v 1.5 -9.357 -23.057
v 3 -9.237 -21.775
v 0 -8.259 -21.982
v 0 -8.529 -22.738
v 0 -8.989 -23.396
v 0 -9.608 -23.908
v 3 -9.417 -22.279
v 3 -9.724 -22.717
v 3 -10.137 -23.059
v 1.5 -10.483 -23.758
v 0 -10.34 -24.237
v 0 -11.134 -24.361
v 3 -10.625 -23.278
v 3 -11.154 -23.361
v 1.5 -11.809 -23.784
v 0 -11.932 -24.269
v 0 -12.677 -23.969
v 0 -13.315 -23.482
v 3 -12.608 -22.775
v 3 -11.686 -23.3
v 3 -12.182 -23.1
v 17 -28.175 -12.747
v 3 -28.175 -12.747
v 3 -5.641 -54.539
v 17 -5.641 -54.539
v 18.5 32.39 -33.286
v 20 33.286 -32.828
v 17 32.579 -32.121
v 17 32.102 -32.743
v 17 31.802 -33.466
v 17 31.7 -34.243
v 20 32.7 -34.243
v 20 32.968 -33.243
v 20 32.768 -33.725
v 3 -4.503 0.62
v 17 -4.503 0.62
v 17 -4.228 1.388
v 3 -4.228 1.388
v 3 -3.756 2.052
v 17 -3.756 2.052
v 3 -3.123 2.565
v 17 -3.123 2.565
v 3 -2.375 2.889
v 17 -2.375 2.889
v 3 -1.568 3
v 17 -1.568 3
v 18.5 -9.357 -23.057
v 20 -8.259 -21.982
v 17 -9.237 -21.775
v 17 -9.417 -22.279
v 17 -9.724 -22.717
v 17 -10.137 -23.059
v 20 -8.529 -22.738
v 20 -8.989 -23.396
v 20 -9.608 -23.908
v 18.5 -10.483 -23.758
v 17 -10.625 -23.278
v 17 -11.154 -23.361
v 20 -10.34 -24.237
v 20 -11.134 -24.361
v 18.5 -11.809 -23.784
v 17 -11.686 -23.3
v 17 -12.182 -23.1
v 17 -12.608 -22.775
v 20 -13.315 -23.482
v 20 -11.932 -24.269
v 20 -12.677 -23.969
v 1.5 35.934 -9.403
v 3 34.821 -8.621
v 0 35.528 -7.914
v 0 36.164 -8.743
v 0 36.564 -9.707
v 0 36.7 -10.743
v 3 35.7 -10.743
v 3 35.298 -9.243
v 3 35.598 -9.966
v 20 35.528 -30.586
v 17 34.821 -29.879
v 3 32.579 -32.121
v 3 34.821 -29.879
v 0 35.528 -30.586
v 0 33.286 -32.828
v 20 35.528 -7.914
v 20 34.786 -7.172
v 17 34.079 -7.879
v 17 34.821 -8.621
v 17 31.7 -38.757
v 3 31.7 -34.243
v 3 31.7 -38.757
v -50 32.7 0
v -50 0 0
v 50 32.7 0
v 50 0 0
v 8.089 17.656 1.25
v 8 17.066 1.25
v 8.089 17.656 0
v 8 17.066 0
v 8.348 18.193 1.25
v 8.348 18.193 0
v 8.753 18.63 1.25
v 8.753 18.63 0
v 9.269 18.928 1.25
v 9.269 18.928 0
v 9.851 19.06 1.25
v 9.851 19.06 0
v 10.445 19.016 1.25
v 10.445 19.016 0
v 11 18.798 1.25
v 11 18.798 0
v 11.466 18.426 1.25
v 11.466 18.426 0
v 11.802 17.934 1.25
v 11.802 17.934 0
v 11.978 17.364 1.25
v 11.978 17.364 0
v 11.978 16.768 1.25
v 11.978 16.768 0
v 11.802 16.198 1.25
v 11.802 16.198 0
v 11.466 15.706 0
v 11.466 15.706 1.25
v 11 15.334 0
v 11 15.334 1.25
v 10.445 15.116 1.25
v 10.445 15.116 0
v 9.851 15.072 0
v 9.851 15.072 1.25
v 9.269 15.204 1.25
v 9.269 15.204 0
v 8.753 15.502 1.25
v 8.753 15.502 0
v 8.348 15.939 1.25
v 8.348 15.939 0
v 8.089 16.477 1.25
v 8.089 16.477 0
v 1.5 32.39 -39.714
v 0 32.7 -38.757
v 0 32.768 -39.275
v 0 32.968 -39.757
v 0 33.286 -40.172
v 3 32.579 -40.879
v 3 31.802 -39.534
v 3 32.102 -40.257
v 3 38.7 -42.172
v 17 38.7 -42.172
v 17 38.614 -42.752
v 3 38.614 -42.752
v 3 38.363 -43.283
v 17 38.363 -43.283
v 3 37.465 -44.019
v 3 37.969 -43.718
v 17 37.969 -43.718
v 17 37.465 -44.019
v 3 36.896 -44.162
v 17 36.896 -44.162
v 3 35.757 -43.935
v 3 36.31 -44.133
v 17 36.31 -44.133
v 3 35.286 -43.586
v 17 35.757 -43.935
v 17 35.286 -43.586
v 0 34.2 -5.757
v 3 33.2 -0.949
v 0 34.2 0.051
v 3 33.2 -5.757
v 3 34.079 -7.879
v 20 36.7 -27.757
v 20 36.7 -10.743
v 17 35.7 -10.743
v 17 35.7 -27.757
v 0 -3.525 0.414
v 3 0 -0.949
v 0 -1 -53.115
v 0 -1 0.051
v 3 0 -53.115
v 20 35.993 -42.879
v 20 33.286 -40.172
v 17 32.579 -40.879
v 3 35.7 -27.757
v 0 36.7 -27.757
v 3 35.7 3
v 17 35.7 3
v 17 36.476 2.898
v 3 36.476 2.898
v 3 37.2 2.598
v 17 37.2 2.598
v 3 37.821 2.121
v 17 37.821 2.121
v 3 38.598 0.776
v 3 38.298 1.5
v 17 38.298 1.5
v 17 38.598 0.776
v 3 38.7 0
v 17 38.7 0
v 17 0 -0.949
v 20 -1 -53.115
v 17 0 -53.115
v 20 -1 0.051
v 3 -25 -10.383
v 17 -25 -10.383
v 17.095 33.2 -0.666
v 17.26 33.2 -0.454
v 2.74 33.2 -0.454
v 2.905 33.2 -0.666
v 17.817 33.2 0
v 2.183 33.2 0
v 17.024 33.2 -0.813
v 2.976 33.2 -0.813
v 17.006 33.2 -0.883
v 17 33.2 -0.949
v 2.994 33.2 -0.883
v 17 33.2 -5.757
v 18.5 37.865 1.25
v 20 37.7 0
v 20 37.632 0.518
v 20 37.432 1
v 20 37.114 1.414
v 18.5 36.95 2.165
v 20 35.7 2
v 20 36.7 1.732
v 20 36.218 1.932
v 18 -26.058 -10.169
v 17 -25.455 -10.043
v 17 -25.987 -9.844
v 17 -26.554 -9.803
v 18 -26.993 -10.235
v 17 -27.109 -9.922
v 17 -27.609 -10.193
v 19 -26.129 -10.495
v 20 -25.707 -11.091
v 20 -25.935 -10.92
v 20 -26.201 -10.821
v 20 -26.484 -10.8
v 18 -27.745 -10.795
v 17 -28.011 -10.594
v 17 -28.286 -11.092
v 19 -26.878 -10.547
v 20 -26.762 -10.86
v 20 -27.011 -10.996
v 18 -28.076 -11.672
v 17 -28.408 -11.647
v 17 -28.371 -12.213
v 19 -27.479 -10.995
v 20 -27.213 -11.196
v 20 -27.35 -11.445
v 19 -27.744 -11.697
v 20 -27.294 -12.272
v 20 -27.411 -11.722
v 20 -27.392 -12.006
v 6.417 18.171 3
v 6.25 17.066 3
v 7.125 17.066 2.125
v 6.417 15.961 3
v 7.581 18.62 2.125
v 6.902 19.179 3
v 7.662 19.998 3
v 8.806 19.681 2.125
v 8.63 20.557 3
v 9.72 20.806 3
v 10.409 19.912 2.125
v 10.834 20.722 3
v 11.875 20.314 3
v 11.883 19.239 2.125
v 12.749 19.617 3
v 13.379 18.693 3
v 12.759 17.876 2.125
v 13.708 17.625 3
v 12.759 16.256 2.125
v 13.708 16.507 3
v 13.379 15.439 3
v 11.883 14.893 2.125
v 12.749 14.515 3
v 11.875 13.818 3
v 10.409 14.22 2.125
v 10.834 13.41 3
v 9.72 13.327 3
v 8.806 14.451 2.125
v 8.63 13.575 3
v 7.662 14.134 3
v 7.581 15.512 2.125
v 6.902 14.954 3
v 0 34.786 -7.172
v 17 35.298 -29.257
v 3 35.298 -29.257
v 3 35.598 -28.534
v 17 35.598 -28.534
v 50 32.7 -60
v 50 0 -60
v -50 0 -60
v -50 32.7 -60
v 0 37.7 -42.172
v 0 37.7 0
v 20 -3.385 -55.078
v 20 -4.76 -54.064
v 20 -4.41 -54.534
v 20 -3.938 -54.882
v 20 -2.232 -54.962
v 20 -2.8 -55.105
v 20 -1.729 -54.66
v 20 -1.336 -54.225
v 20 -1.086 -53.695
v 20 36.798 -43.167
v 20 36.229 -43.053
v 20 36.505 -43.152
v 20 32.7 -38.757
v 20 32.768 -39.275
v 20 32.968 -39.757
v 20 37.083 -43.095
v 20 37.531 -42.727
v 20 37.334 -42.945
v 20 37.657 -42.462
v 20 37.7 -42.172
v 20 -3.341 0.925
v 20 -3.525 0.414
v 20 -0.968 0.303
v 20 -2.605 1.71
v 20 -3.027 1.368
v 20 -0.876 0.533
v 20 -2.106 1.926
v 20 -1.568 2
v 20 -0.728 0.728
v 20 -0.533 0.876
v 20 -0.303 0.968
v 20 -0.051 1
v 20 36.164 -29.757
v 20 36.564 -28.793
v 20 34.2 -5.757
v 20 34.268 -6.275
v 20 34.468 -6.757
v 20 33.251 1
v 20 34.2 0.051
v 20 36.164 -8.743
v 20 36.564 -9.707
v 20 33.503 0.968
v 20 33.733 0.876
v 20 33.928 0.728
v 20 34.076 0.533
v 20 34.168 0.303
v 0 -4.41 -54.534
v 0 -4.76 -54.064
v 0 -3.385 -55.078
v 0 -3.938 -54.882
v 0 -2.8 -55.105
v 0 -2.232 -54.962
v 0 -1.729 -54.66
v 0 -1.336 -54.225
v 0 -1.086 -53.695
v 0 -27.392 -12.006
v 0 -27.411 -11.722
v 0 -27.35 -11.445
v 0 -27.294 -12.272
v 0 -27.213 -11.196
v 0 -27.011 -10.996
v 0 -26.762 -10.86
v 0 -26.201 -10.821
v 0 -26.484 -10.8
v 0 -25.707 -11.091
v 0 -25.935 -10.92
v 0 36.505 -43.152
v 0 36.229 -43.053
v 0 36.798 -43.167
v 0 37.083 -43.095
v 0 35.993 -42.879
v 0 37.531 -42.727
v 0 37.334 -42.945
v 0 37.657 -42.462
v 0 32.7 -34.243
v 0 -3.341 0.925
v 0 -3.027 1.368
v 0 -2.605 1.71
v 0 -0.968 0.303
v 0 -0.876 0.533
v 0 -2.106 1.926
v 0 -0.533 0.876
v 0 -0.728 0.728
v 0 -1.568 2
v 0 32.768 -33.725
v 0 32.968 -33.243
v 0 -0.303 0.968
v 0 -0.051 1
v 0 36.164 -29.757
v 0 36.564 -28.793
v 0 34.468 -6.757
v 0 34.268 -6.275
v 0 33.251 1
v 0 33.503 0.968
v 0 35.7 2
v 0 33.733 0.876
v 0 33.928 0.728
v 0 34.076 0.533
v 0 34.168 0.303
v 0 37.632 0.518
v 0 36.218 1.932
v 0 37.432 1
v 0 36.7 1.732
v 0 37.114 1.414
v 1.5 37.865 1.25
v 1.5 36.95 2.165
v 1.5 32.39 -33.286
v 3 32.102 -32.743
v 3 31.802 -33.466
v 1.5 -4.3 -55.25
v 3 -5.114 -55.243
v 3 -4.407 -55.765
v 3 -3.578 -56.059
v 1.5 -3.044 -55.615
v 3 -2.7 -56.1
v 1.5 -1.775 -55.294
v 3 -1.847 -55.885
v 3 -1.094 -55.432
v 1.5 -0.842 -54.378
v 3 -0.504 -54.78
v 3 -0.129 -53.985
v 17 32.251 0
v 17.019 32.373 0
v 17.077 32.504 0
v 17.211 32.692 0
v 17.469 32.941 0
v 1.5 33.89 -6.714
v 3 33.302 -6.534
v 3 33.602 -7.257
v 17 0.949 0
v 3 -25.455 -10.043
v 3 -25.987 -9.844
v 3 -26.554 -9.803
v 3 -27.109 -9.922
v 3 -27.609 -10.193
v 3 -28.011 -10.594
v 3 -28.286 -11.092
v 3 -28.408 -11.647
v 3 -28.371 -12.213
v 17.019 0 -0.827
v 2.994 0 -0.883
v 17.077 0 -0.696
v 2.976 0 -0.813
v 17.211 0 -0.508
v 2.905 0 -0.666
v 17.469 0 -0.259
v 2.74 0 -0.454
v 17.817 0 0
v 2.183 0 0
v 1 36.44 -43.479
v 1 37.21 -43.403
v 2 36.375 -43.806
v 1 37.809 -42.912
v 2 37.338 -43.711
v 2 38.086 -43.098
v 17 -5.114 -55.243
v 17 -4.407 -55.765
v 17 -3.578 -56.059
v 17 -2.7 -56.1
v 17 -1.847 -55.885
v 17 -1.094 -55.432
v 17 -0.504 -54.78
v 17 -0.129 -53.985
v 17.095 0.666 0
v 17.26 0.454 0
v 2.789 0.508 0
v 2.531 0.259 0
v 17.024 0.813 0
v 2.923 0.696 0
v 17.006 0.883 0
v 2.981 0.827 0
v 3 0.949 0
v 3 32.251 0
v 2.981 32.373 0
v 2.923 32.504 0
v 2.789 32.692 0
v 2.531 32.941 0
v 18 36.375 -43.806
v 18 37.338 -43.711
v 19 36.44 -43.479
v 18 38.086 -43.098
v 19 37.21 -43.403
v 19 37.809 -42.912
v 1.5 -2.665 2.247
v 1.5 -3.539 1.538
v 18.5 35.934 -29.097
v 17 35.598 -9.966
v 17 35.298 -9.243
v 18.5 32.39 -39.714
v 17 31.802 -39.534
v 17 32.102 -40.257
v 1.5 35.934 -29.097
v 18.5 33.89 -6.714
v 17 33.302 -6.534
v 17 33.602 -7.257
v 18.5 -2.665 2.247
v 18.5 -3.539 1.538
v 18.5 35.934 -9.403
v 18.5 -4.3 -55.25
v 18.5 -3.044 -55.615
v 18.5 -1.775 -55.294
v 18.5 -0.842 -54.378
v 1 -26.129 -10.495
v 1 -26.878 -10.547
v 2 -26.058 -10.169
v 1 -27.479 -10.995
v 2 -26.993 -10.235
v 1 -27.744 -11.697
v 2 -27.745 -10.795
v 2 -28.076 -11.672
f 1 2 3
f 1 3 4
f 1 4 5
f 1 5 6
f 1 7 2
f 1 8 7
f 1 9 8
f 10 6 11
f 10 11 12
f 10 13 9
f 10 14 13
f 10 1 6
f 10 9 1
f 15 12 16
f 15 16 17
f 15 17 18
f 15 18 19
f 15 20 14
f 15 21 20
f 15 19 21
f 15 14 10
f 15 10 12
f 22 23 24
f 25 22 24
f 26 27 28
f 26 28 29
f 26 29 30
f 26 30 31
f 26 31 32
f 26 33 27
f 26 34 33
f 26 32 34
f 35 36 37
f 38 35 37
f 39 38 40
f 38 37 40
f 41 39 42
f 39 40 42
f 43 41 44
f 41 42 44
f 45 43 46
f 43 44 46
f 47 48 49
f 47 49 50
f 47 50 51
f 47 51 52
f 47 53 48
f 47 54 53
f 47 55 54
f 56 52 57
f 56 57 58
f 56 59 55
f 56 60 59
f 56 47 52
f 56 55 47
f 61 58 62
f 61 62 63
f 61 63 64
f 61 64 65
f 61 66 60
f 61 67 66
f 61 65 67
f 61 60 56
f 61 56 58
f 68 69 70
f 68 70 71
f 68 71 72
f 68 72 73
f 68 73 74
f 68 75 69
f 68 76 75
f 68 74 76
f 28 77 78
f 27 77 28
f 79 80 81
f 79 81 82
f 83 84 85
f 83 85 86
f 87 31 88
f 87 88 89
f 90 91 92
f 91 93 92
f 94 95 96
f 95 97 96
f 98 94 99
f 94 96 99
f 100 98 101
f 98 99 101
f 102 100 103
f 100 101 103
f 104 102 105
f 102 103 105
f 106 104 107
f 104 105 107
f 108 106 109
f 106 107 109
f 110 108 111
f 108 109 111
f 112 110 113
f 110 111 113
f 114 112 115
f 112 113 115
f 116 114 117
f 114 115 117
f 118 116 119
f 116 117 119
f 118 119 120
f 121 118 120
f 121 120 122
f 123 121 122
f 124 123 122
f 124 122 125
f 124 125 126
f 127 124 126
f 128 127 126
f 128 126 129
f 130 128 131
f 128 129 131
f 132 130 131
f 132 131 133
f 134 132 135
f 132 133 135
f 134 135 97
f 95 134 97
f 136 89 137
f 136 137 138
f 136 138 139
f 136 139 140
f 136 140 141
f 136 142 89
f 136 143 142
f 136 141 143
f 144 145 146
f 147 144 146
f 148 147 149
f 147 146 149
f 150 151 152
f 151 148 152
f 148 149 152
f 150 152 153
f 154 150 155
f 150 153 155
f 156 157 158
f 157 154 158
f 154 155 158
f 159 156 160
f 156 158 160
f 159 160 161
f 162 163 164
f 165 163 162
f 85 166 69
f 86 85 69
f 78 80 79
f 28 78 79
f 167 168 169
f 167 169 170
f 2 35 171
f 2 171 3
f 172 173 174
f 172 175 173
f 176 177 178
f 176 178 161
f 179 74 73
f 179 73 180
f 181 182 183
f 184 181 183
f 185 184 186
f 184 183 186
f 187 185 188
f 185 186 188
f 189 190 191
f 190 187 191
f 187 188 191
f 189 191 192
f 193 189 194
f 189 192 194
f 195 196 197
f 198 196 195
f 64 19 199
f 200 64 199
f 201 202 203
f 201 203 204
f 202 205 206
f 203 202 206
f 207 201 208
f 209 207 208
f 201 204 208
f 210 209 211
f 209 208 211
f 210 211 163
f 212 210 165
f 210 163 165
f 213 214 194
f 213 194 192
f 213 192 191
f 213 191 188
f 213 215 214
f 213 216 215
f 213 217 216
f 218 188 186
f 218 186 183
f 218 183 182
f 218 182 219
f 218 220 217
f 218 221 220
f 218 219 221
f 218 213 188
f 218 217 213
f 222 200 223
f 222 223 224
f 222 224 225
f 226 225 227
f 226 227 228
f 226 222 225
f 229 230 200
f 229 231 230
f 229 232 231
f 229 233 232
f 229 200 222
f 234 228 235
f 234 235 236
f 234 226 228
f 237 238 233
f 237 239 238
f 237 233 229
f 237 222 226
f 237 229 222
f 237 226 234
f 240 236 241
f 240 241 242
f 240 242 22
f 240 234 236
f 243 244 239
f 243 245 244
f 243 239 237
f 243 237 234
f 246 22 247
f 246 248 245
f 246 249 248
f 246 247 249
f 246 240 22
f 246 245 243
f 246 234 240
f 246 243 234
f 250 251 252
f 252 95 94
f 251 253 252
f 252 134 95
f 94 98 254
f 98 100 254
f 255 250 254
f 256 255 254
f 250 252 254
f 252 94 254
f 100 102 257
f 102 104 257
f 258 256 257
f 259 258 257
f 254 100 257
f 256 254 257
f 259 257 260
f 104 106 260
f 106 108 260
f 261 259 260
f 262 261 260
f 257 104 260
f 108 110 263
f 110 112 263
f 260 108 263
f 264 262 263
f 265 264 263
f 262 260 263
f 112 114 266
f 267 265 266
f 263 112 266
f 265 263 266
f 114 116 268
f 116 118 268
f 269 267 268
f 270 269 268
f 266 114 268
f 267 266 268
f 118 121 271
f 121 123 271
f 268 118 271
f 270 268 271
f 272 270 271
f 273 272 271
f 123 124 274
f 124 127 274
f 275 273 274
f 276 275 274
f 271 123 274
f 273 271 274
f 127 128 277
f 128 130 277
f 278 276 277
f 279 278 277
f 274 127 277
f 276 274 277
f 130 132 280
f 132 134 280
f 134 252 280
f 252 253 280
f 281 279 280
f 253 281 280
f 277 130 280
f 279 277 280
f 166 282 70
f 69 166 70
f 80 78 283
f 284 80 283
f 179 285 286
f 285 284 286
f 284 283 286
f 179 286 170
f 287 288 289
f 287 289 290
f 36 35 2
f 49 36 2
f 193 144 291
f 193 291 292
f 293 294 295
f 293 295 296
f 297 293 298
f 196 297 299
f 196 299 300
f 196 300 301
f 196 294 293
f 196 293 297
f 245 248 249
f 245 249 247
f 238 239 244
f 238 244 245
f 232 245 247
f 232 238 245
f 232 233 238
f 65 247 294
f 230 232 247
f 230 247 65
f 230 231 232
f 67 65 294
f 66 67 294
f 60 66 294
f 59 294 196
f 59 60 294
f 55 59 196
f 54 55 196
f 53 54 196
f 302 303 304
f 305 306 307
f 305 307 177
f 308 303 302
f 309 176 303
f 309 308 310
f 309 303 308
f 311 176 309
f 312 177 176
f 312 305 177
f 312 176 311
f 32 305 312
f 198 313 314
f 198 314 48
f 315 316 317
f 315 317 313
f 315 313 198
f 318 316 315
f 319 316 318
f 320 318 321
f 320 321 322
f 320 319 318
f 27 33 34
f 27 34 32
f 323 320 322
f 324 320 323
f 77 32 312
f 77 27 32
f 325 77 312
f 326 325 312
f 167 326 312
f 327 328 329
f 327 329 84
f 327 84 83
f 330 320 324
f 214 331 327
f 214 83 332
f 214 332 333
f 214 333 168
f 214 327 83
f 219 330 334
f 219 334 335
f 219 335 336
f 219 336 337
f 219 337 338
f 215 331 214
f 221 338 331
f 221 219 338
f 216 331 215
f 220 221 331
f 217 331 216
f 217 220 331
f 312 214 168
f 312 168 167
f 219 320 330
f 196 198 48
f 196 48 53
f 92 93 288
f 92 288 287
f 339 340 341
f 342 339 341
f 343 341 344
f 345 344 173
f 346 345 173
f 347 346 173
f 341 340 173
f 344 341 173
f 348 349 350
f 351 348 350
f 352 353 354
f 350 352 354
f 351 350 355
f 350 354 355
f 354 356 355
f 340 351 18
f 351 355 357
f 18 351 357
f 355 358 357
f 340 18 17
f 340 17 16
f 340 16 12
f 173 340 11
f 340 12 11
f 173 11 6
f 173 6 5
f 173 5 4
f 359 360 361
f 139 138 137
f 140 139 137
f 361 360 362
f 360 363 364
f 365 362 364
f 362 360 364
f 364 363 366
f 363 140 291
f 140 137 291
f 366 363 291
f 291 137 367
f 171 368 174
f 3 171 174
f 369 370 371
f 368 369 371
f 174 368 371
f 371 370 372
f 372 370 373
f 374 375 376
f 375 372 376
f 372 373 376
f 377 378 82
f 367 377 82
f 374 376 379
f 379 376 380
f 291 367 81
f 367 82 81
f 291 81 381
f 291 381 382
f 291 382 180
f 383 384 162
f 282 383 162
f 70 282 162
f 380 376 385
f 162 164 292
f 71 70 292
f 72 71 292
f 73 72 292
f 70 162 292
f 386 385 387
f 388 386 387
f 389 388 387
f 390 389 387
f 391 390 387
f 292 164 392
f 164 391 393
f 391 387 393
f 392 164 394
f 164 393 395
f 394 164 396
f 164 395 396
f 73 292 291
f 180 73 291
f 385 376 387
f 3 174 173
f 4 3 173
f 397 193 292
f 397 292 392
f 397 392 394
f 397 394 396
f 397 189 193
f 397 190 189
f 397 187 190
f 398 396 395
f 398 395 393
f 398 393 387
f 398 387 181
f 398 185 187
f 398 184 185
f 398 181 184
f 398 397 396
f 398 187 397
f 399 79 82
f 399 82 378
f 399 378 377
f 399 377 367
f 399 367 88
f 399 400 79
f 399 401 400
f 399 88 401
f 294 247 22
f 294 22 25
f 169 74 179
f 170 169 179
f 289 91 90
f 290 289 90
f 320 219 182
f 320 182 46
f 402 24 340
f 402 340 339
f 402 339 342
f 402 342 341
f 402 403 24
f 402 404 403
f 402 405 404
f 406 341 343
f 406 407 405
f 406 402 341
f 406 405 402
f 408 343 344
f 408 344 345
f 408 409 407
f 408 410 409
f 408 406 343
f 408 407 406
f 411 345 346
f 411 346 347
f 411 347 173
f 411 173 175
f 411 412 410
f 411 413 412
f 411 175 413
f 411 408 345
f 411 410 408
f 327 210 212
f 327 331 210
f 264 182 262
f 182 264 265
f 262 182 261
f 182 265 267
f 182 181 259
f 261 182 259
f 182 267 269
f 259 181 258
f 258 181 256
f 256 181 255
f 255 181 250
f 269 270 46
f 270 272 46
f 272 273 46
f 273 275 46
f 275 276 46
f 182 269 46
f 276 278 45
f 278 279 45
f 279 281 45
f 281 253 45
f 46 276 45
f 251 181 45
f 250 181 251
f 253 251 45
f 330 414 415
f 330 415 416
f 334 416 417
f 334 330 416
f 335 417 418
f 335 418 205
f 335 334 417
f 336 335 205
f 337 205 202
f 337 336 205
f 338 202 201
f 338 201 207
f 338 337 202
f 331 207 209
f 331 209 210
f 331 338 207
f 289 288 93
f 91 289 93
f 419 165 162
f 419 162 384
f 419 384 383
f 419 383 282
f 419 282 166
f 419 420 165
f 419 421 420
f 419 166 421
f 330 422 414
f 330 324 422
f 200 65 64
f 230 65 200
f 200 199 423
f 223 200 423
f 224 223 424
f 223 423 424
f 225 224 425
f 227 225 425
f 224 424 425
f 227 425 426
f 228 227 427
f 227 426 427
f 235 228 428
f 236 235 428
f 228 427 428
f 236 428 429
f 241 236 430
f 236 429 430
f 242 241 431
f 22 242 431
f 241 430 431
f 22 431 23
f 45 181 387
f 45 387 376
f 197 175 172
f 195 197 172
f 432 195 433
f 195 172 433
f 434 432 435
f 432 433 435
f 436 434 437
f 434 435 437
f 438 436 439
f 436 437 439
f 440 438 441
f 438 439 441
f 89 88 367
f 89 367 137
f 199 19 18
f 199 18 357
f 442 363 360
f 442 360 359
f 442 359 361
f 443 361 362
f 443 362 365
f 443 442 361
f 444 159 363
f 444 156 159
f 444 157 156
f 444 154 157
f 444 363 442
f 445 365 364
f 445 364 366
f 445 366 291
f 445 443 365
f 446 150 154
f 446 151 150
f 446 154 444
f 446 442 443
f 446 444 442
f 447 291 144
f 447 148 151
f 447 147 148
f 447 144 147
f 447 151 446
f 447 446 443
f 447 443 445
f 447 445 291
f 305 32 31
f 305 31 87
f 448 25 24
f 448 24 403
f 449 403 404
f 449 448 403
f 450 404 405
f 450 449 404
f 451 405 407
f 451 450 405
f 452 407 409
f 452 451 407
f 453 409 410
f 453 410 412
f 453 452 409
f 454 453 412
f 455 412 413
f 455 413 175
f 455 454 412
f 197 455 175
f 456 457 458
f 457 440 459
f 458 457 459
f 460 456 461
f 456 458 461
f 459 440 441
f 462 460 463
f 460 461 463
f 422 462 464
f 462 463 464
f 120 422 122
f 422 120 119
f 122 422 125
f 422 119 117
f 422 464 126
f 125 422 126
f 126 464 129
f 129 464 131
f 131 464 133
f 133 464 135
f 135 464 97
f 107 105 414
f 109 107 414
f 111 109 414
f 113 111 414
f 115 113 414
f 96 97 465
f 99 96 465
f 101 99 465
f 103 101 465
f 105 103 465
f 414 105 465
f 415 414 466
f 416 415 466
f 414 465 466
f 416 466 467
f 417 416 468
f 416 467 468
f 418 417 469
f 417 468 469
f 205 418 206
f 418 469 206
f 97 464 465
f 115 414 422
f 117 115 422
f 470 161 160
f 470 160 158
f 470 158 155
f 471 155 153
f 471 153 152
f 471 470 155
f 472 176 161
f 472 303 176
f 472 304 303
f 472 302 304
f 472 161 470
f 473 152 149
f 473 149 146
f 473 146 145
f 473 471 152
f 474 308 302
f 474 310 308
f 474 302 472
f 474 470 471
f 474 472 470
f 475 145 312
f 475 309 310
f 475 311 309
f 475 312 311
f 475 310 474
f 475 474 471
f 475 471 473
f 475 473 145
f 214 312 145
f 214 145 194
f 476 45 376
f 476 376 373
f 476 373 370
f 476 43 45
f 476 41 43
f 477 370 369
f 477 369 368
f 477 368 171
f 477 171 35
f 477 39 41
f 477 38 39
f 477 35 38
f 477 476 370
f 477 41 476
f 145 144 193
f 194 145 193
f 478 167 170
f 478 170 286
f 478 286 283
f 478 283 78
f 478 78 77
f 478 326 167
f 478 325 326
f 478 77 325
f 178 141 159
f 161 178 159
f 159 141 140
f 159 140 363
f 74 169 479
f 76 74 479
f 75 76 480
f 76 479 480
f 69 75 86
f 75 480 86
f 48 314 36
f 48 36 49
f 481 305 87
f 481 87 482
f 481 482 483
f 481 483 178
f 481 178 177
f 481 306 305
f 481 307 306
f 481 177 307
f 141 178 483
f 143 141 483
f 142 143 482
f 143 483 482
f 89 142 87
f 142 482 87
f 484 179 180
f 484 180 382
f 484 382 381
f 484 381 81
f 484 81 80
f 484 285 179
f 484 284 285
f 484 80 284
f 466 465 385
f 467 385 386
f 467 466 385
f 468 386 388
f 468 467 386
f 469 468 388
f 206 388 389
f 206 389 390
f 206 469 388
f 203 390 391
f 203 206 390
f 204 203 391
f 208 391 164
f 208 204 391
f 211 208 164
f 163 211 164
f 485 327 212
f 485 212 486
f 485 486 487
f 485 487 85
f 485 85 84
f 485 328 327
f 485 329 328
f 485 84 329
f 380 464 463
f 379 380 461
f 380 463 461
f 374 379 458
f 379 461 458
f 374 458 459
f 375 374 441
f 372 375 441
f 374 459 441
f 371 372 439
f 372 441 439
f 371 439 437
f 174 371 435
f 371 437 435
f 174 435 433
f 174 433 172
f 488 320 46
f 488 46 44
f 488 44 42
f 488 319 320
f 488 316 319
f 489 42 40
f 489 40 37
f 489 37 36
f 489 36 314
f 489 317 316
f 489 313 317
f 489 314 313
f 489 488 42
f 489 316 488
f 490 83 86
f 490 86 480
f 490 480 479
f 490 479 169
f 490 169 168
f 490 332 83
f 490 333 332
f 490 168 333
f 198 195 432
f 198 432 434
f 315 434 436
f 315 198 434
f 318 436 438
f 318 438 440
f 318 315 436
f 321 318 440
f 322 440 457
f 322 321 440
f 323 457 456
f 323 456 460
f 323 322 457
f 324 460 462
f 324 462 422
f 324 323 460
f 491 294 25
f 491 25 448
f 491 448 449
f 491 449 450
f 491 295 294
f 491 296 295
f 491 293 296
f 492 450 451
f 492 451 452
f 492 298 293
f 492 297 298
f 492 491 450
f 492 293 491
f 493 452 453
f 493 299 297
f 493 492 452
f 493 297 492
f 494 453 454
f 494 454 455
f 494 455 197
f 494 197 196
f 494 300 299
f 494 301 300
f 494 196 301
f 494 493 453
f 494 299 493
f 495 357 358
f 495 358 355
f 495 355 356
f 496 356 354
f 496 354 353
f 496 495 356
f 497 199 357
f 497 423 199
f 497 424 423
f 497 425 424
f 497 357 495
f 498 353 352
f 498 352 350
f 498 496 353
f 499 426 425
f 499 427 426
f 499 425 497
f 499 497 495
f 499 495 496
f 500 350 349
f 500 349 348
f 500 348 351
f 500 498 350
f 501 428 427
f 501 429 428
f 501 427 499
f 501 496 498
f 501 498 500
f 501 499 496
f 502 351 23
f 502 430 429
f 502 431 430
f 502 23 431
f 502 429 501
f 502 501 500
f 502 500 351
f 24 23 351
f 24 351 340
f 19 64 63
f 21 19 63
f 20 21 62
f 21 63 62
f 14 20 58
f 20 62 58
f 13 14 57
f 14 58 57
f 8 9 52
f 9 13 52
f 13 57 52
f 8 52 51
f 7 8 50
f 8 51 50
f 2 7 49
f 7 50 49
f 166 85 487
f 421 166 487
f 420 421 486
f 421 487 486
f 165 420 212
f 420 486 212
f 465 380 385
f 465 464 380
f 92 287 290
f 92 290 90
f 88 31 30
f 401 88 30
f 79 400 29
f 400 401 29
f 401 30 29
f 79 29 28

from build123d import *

# Parameters (mm, degrees)
F0_W            = 32.7
F0_H            = 60
F1_DEPTH        = 50
F1_DEPTH_BACK   = 50
F3_DEPTH        = 20
F4_R            = 3
F5_R            = 2
F6_R            = 3
F7_R            = 2
F8_R            = 3
F9_SIZE2        = 1
F9_SIZE         = 3
F10_SIZE2       = 3
F10_SIZE        = 1
F12_D           = 4
F12_CSINK_D     = 7.5
F12_CSINK_ANGLE = 90
F13_R           = 1


with BuildPart() as f1:
    # F0 (on Right) → F1 (new body, two sides)
    with BuildSketch(Plane.YZ) as f1_sk:
        with Locations((16.35, -30)):
            Rectangle(F0_W, F0_H)
    extrude(amount=F1_DEPTH)
    extrude(f1_sk.sketch, amount=-F1_DEPTH_BACK)


with BuildPart() as f3:
    # F2 (on Right) → F3 (new body)
    with BuildSketch(Plane.YZ):
        with BuildLine():
            Line((-28.1746166165, -12.7468722772), (0, -65))
            Line((0, -65), (0, 0))
            Line((0, 0), (33.2, 0))
            Line((33.2, 0), (33.2, -7))
            Line((33.2, -7), (35.7, -9.5))
            Line((35.7, -9.5), (35.7, -29))
            Line((35.7, -29), (31.7, -33))
            Line((31.7, -33), (31.7, -40))
            Line((31.7, -40), (38.7, -47))
            Line((38.7, -47), (38.7, 3))
            Line((38.7, 3), (-4, 3))
            Line((-4, 3), (-10, -25.3834584793))
            Line((-10, -25.3834584793), (-25, -10.3834584793))
            ThreePointArc((-25, -10.3834584793), (-27.6085305161, -10.1934254852), (-28.1746166165, -12.7468722772))
        make_face()
    extrude(amount=F3_DEPTH)

    # F4
    f4_edges = [f3.edges().sort_by_distance(p)[0] for p in [
        (10, 0, -65),
    ]]
    fillet(f4_edges, radius=F4_R)

    # F5
    f5_edges = [f3.edges().sort_by_distance(p)[0] for p in [
        (10, -10, -25.383458),
    ]]
    fillet(f5_edges, radius=F5_R)

    # F6
    f6_edges = [f3.edges().sort_by_distance(p)[0] for p in [
        (10, -4, 3),
        (10, 38.7, 3),
    ]]
    fillet(f6_edges, radius=F6_R)

    # F7
    f7_edges = [f3.edges().sort_by_distance(p)[0] for p in [
        (10, 38.7, -47),
    ]]
    fillet(f7_edges, radius=F7_R)

    # F8
    f8_edges = [f3.edges().sort_by_distance(p)[0] for p in [
        (10, 33.2, -7),
        (10, 35.7, -9.5),
        (10, 35.7, -29),
        (10, 31.7, -33),
        (10, 31.7, -40),
    ]]
    fillet(f8_edges, radius=F8_R)

    # F9
    f9_edges = [f3.edges().sort_by_distance(p)[0] for p in [
        (20, 33.932233, -42.232233),
        (20, 31.928361, -39.90541),
        (20, 37.465367, -44.019332),
        (20, 31.7, -36.5),
        (20, 38.7, -21.085786),
        (20, 31.928361, -33.09459),
        (20, 37.82132, 2.12132),
        (20, 33.7, -31),
        (20, 17.066062, 3),
        (20, 35.471639, -28.90541),
        (20, -3.457137, 2.330384),
        (20, 35.7, -19.25),
        (20, -6.870084, -10.577149),
        (20, 35.471639, -9.59459),
        (20, -10.624812, -23.278441),
        (20, 34.45, -8.25),
        (20, -18.804063, -16.579396),
        (20, 33.428361, -6.90541),
        (20, -27.608531, -10.193425),
        (20, 33.2, -2.87868),
        (20, -16.907611, -33.642855),
        (20, 16.6, 0),
        (20, -2.26577, -56.023801),
        (20, 0, -26.557519),
    ]]
    chamfer(f9_edges, length=F9_SIZE, length2=F9_SIZE2)

    # F10
    f10_edges = [f3.edges().sort_by_distance(p)[0] for p in [
        (0, 33.932233, -42.232233),
        (0, 31.928361, -39.90541),
        (0, 37.465367, -44.019332),
        (0, 31.7, -36.5),
        (0, 38.7, -21.085786),
        (0, 31.928361, -33.09459),
        (0, 37.82132, 2.12132),
        (0, 33.7, -31),
        (0, 17.066062, 3),
        (0, 35.471639, -28.90541),
        (0, -3.457137, 2.330384),
        (0, 35.7, -19.25),
        (0, -6.870084, -10.577149),
        (0, 35.471639, -9.59459),
        (0, -10.624812, -23.278441),
        (0, 34.45, -8.25),
        (0, -18.804063, -16.579396),
        (0, 33.428361, -6.90541),
        (0, -27.608531, -10.193425),
        (0, 33.2, -2.87868),
        (0, -16.907611, -33.642855),
        (0, 16.6, 0),
        (0, -2.26577, -56.023801),
        (0, 0, -26.557519),
    ]]
    f10_side = f3.faces().sort_by_distance((0, 34.564645, -41.599821))[0]
    chamfer(f10_edges, length=F10_SIZE, length2=F10_SIZE2, reference=f10_side)

    # F12 (through all)
    with Locations(Plane.XY.offset(3)):
        with Locations((10, 17.0660621668)):
            CounterSinkHole(F12_D / 2, F12_CSINK_D / 2, counter_sink_angle=F12_CSINK_ANGLE)

    # F13 (call 1 of 4: OpenCascade refuses the feature's edges together)
    f13_edges = [f3.edges().sort_by_distance(p)[0] for p in [
        (18.5, -0.5, 0.5),
    ]]
    fillet(f13_edges, radius=F13_R)

    # F13#2 (call 2 of 4)
    f13_2_edges = [f3.edges().sort_by_distance(p)[0] for p in [
        (18.5, 33.7, 0.5),
    ]]
    fillet(f13_2_edges, radius=F13_R)

    # F13#3 (call 3 of 4)
    f13_3_edges = [f3.edges().sort_by_distance(p)[0] for p in [
        (1.5, -0.5, 0.5),
    ]]
    fillet(f13_3_edges, radius=F13_R)

    # F13#4 (call 4 of 4)
    f13_4_edges = [f3.edges().sort_by_distance(p)[0] for p in [
        (1.5, 33.7, 0.5),
    ]]
    fillet(f13_4_edges, radius=F13_R)


solid = Compound([f1.part, f3.part])
